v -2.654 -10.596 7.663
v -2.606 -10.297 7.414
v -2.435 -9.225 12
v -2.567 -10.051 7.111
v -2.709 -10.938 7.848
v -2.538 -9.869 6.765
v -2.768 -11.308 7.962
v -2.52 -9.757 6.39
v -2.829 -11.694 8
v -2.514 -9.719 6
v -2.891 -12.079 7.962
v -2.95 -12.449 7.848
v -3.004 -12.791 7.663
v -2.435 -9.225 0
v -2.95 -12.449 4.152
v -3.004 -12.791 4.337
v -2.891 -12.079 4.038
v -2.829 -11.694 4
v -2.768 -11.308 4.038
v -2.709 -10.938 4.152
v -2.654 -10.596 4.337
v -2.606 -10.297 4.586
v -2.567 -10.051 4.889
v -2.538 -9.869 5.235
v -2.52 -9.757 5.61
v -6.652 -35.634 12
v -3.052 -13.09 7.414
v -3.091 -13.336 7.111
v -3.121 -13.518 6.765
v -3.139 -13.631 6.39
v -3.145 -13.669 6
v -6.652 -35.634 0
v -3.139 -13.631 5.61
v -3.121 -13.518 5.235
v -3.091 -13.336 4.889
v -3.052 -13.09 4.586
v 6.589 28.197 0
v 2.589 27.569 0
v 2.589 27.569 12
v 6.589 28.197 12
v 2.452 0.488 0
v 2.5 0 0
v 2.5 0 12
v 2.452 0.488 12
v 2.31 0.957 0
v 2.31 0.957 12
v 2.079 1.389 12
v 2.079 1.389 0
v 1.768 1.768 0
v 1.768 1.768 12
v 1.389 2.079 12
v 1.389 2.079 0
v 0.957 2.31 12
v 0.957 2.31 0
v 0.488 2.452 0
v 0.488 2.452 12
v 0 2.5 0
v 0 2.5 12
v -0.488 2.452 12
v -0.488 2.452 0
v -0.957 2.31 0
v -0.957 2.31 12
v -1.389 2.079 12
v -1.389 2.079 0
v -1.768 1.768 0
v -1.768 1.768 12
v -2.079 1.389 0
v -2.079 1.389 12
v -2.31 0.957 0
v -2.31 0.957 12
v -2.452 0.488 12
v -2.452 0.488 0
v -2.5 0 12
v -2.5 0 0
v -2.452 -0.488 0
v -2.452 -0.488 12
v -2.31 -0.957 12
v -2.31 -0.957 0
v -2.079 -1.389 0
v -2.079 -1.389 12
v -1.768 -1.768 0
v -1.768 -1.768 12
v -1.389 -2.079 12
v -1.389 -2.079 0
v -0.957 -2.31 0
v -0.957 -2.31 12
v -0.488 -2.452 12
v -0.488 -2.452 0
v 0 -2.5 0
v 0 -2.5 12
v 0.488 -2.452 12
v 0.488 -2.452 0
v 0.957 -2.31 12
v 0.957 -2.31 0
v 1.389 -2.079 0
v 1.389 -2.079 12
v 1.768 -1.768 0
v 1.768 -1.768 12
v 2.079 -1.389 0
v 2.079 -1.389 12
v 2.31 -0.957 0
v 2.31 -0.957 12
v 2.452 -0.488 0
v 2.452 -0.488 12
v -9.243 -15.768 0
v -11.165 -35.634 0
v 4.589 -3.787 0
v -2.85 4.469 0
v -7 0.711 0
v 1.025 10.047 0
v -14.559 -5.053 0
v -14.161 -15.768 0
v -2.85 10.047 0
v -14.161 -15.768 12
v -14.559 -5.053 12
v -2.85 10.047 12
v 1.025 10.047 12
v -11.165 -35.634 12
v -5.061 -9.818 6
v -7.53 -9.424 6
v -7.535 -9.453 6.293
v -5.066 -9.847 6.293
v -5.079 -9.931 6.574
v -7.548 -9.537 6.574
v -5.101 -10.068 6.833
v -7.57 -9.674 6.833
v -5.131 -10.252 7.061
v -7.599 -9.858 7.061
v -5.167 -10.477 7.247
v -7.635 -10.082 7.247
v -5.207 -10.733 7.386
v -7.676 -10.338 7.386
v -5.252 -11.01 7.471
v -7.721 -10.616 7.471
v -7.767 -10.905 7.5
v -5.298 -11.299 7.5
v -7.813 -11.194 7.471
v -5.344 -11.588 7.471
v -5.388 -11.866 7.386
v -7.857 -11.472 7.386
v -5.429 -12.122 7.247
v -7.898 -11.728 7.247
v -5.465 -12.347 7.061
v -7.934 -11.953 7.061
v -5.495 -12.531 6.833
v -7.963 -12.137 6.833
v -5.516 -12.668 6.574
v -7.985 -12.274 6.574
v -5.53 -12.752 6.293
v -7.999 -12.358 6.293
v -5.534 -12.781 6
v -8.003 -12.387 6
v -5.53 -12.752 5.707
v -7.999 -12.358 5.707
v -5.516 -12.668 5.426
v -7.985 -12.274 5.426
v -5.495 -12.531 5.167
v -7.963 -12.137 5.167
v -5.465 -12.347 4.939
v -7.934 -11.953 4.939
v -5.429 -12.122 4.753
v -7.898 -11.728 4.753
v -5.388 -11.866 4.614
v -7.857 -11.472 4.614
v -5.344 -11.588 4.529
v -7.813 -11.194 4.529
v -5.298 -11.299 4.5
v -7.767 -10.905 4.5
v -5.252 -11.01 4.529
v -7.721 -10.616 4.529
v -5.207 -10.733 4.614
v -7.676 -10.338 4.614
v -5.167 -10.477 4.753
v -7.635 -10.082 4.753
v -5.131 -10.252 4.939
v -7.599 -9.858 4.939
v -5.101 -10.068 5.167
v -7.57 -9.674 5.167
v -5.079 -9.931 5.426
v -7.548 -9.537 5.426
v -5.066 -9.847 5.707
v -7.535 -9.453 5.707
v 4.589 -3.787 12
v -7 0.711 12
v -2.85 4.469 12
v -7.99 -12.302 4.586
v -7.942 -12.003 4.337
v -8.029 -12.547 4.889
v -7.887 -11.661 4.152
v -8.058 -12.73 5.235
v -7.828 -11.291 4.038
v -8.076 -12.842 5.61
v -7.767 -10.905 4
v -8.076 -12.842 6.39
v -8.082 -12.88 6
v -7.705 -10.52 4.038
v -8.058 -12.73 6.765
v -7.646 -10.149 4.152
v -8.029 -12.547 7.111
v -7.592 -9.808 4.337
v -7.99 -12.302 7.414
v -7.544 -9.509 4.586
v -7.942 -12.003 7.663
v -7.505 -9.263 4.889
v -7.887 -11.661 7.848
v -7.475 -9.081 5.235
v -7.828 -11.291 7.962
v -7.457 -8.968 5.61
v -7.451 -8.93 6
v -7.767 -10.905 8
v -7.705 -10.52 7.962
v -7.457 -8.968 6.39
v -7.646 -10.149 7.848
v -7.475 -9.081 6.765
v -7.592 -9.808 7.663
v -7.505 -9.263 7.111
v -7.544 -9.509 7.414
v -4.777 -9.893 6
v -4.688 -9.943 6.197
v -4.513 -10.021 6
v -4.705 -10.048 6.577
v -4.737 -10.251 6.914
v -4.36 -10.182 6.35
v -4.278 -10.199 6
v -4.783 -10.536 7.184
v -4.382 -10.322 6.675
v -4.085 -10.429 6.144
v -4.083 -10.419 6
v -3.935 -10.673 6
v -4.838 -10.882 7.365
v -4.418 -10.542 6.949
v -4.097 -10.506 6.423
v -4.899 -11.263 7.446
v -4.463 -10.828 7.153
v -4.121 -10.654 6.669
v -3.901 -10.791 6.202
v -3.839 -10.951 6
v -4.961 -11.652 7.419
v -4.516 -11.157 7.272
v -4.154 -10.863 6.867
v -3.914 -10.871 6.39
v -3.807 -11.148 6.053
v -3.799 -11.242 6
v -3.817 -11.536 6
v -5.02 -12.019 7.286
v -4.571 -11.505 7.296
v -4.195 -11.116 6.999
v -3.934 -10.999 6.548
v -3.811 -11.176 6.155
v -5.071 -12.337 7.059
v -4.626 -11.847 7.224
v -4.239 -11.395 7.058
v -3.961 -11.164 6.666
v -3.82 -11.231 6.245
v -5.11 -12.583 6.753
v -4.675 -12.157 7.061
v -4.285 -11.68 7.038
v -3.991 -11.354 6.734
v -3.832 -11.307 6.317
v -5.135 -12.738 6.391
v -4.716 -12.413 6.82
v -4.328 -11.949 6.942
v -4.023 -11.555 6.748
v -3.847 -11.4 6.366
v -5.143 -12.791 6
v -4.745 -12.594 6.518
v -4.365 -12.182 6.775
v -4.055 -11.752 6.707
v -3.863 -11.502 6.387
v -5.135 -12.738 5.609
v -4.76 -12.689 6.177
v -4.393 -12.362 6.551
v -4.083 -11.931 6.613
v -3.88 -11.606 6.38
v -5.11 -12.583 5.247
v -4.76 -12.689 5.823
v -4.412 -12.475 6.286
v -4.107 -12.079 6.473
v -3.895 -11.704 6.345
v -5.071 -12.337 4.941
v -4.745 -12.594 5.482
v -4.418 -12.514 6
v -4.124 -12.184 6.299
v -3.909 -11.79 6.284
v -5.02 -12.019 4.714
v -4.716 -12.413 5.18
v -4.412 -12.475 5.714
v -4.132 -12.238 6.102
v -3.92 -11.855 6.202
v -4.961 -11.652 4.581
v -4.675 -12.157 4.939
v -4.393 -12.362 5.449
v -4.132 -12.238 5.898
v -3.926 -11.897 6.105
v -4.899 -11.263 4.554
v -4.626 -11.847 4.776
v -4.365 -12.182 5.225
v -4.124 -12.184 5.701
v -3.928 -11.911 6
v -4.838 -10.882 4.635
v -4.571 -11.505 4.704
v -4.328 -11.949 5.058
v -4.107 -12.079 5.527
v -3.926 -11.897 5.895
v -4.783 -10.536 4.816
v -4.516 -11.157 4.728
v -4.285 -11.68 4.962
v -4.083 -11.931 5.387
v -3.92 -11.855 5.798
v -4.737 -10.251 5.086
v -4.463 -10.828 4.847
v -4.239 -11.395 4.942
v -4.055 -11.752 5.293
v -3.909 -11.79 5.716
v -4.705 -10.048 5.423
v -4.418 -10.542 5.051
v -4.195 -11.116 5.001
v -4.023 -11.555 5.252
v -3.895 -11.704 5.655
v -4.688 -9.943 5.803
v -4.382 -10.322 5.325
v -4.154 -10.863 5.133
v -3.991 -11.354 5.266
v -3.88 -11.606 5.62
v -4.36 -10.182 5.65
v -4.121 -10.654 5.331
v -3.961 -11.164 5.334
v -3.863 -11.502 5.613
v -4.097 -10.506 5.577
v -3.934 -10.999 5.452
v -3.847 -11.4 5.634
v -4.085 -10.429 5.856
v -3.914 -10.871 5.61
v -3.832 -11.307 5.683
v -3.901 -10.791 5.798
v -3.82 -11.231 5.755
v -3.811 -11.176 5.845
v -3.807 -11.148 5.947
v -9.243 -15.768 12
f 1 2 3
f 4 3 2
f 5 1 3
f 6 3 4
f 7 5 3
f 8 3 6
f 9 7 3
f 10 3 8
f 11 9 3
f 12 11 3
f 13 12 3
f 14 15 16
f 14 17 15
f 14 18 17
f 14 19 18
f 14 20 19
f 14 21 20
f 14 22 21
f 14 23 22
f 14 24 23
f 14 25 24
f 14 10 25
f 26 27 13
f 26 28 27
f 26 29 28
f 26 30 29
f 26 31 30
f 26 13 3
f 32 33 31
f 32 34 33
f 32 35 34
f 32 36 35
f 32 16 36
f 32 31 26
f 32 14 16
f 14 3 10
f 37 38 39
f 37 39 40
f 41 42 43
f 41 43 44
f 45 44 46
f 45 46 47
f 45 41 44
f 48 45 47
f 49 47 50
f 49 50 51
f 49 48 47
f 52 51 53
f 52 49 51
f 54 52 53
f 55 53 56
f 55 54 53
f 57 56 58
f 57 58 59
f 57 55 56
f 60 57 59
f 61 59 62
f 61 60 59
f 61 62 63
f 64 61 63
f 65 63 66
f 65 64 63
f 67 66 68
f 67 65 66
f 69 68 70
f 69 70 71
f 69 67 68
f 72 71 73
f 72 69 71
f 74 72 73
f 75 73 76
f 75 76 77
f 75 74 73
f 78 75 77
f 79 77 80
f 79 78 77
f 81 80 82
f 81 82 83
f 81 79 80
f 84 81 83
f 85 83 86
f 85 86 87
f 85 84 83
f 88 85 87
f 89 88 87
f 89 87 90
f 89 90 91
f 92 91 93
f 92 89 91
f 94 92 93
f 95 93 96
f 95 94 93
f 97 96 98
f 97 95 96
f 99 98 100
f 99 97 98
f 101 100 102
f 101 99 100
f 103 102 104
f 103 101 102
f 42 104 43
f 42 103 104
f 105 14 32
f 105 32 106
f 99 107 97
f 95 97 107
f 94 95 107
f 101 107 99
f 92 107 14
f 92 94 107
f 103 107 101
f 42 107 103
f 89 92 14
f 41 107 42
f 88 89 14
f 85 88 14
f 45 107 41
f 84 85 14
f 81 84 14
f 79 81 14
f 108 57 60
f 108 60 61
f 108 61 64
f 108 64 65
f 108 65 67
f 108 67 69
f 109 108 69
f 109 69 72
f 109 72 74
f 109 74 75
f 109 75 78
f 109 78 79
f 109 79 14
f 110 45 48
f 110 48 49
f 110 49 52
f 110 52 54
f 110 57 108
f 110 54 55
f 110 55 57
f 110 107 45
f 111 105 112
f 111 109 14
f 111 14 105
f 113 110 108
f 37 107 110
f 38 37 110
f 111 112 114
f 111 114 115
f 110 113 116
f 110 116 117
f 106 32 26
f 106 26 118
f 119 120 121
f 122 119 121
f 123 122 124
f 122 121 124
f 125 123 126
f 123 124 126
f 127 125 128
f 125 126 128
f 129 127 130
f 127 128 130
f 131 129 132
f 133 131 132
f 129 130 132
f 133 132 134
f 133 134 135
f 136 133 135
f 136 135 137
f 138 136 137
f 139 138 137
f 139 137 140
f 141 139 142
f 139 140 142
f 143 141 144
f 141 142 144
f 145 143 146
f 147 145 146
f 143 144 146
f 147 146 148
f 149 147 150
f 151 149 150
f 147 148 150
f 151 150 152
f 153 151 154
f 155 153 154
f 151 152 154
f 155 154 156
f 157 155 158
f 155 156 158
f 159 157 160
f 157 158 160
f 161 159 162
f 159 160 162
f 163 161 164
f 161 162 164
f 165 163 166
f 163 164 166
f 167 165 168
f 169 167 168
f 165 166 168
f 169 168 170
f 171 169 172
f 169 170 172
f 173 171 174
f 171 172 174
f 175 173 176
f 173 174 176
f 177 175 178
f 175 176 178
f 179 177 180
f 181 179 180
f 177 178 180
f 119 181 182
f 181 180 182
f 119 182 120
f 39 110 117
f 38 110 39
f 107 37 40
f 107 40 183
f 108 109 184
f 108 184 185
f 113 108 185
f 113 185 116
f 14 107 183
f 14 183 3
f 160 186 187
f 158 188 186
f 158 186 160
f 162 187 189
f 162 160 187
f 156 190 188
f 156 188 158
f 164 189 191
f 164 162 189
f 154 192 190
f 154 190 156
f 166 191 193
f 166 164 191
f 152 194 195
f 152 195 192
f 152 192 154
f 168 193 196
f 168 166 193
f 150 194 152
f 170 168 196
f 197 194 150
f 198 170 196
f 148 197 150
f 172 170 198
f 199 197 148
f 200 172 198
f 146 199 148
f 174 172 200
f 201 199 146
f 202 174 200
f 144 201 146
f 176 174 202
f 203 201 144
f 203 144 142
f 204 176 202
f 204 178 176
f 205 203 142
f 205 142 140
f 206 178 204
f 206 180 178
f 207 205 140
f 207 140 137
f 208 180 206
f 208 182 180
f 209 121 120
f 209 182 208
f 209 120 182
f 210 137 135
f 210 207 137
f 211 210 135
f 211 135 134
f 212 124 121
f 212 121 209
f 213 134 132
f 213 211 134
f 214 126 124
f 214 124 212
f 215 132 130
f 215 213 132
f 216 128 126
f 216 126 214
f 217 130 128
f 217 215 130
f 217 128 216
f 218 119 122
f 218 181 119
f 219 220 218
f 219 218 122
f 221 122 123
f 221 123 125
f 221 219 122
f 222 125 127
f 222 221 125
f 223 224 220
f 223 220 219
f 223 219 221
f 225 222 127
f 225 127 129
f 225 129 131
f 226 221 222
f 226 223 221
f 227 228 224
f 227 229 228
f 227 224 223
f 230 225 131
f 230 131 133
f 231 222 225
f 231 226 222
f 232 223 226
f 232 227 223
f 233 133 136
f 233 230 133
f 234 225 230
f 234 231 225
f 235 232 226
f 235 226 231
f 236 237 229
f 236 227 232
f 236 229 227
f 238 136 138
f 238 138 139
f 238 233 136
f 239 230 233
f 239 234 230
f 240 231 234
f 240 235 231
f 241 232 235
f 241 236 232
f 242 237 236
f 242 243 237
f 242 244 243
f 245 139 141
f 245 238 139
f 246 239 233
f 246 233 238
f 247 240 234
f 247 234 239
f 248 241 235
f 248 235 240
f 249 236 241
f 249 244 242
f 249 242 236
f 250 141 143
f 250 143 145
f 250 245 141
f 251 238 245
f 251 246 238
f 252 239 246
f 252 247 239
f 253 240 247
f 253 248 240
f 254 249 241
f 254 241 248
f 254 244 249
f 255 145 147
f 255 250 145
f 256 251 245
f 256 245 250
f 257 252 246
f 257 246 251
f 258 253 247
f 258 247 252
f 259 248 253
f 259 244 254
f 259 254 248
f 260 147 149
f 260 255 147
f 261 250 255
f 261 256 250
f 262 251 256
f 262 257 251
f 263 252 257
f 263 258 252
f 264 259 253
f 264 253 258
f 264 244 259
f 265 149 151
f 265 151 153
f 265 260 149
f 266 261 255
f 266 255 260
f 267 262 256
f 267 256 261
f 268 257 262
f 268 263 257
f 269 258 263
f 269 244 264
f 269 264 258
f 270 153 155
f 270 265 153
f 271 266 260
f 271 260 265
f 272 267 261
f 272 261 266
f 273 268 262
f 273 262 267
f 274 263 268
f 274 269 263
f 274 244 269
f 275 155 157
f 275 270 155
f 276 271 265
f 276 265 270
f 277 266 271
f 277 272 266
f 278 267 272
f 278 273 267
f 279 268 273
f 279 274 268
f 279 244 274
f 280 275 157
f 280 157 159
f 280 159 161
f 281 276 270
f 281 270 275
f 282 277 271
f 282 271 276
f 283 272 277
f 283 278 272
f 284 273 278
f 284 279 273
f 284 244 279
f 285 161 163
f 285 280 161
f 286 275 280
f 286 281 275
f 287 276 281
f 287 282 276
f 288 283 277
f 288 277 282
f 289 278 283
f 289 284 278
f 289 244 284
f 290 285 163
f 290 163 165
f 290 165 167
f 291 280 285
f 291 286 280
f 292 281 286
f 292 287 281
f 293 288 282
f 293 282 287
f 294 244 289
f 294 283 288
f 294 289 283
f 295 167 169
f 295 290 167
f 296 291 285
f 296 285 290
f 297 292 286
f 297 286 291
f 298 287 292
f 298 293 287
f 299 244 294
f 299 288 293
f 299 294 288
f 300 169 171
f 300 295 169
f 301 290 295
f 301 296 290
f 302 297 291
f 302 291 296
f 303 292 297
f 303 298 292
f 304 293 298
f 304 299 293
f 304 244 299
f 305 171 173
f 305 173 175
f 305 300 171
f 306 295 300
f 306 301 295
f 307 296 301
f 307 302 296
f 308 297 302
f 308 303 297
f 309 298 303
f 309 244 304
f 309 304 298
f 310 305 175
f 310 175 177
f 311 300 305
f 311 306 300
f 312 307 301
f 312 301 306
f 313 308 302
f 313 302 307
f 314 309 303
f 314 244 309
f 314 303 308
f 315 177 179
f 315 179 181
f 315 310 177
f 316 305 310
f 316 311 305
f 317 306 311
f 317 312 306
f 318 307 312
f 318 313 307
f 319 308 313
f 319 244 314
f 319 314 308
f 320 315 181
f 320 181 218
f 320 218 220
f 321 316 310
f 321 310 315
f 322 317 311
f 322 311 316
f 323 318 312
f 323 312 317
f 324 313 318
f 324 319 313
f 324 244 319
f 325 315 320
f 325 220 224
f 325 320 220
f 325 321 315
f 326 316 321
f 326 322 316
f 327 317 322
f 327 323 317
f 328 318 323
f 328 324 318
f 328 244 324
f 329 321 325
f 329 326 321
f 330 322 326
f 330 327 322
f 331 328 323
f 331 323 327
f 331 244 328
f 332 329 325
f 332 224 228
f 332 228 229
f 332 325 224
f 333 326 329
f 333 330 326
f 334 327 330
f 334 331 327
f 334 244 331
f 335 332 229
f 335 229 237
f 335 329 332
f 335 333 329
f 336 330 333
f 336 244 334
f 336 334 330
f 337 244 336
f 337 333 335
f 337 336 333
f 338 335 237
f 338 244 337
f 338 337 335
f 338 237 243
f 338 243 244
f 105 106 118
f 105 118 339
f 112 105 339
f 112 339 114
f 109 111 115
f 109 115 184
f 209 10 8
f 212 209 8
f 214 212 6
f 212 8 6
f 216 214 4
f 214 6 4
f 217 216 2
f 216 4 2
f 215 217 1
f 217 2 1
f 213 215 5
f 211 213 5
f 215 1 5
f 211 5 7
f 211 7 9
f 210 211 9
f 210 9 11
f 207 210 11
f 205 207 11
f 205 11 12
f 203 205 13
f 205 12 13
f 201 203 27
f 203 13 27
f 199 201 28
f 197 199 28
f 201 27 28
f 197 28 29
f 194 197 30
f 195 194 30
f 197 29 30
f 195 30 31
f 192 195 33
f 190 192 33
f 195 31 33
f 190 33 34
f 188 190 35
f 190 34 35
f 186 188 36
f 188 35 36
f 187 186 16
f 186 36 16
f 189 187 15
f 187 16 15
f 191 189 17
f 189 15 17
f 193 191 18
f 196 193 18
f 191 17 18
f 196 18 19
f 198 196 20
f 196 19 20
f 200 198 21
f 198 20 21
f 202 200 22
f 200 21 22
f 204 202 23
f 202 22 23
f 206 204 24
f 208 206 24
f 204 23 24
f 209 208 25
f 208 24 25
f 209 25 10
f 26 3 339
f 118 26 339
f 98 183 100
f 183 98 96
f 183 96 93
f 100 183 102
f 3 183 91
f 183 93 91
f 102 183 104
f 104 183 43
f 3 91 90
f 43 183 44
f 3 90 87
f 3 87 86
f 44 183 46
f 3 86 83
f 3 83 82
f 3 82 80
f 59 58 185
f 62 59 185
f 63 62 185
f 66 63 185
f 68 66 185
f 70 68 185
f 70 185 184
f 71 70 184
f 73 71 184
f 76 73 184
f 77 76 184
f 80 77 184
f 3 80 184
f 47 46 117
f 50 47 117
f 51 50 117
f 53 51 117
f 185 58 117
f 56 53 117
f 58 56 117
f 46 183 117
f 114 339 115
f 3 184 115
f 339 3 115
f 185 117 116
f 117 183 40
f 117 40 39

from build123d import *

# Parameters (mm, degrees)
SKETCH_1_R          = 2.5
EXTRUDE_1_DEPTH     = 12
SKETCH_2_R          = 2
CUT_EXTRUDE_1_DEPTH = 5
SKETCH_3_R          = 1.5
EXTRUDE_2_DEPTH     = 4
FILLET_1_R          = 1.5


with BuildPart() as part:
    # 스케치1 → 보스-돌출1 (new body)
    with BuildSketch(Plane.XY):
        Polygon((6.588838908, 28.19675948), (4.588838908, -3.787132496), (-2.435084758, -9.224887606), (-6.651746097, -35.634279915), (-11.1649155, -35.634279915), (-9.242889687, -15.767948861), (-14.161167405, -15.767948861), (-14.558519827, -5.05323729), (-7, 0.71086224), (-2.849537727, 4.46912262), (-2.849537727, 10.047291676), (1.024768486, 10.047291676), (2.588838908, 27.569044976), align=None)
        Circle(SKETCH_1_R, mode=Mode.SUBTRACT)
    extrude(amount=EXTRUDE_1_DEPTH)

    # 스케치2 → 컷-돌출1 (cut)
    with BuildSketch(Plane(origin=(-0.938271737, 0.14980936, 0), x_dir=(0, 0, -1), z_dir=(0.9874921543617721, -0.1576681485714416, 0))):
        with Locations(Location((-6, -11.993439441, 0), (0, 0, 90))):
            Circle(SKETCH_2_R)
    extrude(amount=-CUT_EXTRUDE_1_DEPTH, mode=Mode.SUBTRACT)

    # 스케치3 → 보스-돌출2 (add)
    with BuildSketch(Plane(origin=(-5.875732509, 0.938150103, 0), x_dir=(0, 0, -1), z_dir=(0.9874921543617721, -0.1576681485714416, 0))):
        with Locations(Location((-6, -11.993439441, 0), (0, 0, 90))):
            Circle(SKETCH_3_R)
    extrude(amount=EXTRUDE_2_DEPTH)

    # 필렛1
    fillet_1_edges = [part.edges().sort_by_distance(p)[0] for p in [
        (-4.053249506, -13.017188075, 6),
    ]]
    fillet(fillet_1_edges, radius=FILLET_1_R)


solid = part.part
